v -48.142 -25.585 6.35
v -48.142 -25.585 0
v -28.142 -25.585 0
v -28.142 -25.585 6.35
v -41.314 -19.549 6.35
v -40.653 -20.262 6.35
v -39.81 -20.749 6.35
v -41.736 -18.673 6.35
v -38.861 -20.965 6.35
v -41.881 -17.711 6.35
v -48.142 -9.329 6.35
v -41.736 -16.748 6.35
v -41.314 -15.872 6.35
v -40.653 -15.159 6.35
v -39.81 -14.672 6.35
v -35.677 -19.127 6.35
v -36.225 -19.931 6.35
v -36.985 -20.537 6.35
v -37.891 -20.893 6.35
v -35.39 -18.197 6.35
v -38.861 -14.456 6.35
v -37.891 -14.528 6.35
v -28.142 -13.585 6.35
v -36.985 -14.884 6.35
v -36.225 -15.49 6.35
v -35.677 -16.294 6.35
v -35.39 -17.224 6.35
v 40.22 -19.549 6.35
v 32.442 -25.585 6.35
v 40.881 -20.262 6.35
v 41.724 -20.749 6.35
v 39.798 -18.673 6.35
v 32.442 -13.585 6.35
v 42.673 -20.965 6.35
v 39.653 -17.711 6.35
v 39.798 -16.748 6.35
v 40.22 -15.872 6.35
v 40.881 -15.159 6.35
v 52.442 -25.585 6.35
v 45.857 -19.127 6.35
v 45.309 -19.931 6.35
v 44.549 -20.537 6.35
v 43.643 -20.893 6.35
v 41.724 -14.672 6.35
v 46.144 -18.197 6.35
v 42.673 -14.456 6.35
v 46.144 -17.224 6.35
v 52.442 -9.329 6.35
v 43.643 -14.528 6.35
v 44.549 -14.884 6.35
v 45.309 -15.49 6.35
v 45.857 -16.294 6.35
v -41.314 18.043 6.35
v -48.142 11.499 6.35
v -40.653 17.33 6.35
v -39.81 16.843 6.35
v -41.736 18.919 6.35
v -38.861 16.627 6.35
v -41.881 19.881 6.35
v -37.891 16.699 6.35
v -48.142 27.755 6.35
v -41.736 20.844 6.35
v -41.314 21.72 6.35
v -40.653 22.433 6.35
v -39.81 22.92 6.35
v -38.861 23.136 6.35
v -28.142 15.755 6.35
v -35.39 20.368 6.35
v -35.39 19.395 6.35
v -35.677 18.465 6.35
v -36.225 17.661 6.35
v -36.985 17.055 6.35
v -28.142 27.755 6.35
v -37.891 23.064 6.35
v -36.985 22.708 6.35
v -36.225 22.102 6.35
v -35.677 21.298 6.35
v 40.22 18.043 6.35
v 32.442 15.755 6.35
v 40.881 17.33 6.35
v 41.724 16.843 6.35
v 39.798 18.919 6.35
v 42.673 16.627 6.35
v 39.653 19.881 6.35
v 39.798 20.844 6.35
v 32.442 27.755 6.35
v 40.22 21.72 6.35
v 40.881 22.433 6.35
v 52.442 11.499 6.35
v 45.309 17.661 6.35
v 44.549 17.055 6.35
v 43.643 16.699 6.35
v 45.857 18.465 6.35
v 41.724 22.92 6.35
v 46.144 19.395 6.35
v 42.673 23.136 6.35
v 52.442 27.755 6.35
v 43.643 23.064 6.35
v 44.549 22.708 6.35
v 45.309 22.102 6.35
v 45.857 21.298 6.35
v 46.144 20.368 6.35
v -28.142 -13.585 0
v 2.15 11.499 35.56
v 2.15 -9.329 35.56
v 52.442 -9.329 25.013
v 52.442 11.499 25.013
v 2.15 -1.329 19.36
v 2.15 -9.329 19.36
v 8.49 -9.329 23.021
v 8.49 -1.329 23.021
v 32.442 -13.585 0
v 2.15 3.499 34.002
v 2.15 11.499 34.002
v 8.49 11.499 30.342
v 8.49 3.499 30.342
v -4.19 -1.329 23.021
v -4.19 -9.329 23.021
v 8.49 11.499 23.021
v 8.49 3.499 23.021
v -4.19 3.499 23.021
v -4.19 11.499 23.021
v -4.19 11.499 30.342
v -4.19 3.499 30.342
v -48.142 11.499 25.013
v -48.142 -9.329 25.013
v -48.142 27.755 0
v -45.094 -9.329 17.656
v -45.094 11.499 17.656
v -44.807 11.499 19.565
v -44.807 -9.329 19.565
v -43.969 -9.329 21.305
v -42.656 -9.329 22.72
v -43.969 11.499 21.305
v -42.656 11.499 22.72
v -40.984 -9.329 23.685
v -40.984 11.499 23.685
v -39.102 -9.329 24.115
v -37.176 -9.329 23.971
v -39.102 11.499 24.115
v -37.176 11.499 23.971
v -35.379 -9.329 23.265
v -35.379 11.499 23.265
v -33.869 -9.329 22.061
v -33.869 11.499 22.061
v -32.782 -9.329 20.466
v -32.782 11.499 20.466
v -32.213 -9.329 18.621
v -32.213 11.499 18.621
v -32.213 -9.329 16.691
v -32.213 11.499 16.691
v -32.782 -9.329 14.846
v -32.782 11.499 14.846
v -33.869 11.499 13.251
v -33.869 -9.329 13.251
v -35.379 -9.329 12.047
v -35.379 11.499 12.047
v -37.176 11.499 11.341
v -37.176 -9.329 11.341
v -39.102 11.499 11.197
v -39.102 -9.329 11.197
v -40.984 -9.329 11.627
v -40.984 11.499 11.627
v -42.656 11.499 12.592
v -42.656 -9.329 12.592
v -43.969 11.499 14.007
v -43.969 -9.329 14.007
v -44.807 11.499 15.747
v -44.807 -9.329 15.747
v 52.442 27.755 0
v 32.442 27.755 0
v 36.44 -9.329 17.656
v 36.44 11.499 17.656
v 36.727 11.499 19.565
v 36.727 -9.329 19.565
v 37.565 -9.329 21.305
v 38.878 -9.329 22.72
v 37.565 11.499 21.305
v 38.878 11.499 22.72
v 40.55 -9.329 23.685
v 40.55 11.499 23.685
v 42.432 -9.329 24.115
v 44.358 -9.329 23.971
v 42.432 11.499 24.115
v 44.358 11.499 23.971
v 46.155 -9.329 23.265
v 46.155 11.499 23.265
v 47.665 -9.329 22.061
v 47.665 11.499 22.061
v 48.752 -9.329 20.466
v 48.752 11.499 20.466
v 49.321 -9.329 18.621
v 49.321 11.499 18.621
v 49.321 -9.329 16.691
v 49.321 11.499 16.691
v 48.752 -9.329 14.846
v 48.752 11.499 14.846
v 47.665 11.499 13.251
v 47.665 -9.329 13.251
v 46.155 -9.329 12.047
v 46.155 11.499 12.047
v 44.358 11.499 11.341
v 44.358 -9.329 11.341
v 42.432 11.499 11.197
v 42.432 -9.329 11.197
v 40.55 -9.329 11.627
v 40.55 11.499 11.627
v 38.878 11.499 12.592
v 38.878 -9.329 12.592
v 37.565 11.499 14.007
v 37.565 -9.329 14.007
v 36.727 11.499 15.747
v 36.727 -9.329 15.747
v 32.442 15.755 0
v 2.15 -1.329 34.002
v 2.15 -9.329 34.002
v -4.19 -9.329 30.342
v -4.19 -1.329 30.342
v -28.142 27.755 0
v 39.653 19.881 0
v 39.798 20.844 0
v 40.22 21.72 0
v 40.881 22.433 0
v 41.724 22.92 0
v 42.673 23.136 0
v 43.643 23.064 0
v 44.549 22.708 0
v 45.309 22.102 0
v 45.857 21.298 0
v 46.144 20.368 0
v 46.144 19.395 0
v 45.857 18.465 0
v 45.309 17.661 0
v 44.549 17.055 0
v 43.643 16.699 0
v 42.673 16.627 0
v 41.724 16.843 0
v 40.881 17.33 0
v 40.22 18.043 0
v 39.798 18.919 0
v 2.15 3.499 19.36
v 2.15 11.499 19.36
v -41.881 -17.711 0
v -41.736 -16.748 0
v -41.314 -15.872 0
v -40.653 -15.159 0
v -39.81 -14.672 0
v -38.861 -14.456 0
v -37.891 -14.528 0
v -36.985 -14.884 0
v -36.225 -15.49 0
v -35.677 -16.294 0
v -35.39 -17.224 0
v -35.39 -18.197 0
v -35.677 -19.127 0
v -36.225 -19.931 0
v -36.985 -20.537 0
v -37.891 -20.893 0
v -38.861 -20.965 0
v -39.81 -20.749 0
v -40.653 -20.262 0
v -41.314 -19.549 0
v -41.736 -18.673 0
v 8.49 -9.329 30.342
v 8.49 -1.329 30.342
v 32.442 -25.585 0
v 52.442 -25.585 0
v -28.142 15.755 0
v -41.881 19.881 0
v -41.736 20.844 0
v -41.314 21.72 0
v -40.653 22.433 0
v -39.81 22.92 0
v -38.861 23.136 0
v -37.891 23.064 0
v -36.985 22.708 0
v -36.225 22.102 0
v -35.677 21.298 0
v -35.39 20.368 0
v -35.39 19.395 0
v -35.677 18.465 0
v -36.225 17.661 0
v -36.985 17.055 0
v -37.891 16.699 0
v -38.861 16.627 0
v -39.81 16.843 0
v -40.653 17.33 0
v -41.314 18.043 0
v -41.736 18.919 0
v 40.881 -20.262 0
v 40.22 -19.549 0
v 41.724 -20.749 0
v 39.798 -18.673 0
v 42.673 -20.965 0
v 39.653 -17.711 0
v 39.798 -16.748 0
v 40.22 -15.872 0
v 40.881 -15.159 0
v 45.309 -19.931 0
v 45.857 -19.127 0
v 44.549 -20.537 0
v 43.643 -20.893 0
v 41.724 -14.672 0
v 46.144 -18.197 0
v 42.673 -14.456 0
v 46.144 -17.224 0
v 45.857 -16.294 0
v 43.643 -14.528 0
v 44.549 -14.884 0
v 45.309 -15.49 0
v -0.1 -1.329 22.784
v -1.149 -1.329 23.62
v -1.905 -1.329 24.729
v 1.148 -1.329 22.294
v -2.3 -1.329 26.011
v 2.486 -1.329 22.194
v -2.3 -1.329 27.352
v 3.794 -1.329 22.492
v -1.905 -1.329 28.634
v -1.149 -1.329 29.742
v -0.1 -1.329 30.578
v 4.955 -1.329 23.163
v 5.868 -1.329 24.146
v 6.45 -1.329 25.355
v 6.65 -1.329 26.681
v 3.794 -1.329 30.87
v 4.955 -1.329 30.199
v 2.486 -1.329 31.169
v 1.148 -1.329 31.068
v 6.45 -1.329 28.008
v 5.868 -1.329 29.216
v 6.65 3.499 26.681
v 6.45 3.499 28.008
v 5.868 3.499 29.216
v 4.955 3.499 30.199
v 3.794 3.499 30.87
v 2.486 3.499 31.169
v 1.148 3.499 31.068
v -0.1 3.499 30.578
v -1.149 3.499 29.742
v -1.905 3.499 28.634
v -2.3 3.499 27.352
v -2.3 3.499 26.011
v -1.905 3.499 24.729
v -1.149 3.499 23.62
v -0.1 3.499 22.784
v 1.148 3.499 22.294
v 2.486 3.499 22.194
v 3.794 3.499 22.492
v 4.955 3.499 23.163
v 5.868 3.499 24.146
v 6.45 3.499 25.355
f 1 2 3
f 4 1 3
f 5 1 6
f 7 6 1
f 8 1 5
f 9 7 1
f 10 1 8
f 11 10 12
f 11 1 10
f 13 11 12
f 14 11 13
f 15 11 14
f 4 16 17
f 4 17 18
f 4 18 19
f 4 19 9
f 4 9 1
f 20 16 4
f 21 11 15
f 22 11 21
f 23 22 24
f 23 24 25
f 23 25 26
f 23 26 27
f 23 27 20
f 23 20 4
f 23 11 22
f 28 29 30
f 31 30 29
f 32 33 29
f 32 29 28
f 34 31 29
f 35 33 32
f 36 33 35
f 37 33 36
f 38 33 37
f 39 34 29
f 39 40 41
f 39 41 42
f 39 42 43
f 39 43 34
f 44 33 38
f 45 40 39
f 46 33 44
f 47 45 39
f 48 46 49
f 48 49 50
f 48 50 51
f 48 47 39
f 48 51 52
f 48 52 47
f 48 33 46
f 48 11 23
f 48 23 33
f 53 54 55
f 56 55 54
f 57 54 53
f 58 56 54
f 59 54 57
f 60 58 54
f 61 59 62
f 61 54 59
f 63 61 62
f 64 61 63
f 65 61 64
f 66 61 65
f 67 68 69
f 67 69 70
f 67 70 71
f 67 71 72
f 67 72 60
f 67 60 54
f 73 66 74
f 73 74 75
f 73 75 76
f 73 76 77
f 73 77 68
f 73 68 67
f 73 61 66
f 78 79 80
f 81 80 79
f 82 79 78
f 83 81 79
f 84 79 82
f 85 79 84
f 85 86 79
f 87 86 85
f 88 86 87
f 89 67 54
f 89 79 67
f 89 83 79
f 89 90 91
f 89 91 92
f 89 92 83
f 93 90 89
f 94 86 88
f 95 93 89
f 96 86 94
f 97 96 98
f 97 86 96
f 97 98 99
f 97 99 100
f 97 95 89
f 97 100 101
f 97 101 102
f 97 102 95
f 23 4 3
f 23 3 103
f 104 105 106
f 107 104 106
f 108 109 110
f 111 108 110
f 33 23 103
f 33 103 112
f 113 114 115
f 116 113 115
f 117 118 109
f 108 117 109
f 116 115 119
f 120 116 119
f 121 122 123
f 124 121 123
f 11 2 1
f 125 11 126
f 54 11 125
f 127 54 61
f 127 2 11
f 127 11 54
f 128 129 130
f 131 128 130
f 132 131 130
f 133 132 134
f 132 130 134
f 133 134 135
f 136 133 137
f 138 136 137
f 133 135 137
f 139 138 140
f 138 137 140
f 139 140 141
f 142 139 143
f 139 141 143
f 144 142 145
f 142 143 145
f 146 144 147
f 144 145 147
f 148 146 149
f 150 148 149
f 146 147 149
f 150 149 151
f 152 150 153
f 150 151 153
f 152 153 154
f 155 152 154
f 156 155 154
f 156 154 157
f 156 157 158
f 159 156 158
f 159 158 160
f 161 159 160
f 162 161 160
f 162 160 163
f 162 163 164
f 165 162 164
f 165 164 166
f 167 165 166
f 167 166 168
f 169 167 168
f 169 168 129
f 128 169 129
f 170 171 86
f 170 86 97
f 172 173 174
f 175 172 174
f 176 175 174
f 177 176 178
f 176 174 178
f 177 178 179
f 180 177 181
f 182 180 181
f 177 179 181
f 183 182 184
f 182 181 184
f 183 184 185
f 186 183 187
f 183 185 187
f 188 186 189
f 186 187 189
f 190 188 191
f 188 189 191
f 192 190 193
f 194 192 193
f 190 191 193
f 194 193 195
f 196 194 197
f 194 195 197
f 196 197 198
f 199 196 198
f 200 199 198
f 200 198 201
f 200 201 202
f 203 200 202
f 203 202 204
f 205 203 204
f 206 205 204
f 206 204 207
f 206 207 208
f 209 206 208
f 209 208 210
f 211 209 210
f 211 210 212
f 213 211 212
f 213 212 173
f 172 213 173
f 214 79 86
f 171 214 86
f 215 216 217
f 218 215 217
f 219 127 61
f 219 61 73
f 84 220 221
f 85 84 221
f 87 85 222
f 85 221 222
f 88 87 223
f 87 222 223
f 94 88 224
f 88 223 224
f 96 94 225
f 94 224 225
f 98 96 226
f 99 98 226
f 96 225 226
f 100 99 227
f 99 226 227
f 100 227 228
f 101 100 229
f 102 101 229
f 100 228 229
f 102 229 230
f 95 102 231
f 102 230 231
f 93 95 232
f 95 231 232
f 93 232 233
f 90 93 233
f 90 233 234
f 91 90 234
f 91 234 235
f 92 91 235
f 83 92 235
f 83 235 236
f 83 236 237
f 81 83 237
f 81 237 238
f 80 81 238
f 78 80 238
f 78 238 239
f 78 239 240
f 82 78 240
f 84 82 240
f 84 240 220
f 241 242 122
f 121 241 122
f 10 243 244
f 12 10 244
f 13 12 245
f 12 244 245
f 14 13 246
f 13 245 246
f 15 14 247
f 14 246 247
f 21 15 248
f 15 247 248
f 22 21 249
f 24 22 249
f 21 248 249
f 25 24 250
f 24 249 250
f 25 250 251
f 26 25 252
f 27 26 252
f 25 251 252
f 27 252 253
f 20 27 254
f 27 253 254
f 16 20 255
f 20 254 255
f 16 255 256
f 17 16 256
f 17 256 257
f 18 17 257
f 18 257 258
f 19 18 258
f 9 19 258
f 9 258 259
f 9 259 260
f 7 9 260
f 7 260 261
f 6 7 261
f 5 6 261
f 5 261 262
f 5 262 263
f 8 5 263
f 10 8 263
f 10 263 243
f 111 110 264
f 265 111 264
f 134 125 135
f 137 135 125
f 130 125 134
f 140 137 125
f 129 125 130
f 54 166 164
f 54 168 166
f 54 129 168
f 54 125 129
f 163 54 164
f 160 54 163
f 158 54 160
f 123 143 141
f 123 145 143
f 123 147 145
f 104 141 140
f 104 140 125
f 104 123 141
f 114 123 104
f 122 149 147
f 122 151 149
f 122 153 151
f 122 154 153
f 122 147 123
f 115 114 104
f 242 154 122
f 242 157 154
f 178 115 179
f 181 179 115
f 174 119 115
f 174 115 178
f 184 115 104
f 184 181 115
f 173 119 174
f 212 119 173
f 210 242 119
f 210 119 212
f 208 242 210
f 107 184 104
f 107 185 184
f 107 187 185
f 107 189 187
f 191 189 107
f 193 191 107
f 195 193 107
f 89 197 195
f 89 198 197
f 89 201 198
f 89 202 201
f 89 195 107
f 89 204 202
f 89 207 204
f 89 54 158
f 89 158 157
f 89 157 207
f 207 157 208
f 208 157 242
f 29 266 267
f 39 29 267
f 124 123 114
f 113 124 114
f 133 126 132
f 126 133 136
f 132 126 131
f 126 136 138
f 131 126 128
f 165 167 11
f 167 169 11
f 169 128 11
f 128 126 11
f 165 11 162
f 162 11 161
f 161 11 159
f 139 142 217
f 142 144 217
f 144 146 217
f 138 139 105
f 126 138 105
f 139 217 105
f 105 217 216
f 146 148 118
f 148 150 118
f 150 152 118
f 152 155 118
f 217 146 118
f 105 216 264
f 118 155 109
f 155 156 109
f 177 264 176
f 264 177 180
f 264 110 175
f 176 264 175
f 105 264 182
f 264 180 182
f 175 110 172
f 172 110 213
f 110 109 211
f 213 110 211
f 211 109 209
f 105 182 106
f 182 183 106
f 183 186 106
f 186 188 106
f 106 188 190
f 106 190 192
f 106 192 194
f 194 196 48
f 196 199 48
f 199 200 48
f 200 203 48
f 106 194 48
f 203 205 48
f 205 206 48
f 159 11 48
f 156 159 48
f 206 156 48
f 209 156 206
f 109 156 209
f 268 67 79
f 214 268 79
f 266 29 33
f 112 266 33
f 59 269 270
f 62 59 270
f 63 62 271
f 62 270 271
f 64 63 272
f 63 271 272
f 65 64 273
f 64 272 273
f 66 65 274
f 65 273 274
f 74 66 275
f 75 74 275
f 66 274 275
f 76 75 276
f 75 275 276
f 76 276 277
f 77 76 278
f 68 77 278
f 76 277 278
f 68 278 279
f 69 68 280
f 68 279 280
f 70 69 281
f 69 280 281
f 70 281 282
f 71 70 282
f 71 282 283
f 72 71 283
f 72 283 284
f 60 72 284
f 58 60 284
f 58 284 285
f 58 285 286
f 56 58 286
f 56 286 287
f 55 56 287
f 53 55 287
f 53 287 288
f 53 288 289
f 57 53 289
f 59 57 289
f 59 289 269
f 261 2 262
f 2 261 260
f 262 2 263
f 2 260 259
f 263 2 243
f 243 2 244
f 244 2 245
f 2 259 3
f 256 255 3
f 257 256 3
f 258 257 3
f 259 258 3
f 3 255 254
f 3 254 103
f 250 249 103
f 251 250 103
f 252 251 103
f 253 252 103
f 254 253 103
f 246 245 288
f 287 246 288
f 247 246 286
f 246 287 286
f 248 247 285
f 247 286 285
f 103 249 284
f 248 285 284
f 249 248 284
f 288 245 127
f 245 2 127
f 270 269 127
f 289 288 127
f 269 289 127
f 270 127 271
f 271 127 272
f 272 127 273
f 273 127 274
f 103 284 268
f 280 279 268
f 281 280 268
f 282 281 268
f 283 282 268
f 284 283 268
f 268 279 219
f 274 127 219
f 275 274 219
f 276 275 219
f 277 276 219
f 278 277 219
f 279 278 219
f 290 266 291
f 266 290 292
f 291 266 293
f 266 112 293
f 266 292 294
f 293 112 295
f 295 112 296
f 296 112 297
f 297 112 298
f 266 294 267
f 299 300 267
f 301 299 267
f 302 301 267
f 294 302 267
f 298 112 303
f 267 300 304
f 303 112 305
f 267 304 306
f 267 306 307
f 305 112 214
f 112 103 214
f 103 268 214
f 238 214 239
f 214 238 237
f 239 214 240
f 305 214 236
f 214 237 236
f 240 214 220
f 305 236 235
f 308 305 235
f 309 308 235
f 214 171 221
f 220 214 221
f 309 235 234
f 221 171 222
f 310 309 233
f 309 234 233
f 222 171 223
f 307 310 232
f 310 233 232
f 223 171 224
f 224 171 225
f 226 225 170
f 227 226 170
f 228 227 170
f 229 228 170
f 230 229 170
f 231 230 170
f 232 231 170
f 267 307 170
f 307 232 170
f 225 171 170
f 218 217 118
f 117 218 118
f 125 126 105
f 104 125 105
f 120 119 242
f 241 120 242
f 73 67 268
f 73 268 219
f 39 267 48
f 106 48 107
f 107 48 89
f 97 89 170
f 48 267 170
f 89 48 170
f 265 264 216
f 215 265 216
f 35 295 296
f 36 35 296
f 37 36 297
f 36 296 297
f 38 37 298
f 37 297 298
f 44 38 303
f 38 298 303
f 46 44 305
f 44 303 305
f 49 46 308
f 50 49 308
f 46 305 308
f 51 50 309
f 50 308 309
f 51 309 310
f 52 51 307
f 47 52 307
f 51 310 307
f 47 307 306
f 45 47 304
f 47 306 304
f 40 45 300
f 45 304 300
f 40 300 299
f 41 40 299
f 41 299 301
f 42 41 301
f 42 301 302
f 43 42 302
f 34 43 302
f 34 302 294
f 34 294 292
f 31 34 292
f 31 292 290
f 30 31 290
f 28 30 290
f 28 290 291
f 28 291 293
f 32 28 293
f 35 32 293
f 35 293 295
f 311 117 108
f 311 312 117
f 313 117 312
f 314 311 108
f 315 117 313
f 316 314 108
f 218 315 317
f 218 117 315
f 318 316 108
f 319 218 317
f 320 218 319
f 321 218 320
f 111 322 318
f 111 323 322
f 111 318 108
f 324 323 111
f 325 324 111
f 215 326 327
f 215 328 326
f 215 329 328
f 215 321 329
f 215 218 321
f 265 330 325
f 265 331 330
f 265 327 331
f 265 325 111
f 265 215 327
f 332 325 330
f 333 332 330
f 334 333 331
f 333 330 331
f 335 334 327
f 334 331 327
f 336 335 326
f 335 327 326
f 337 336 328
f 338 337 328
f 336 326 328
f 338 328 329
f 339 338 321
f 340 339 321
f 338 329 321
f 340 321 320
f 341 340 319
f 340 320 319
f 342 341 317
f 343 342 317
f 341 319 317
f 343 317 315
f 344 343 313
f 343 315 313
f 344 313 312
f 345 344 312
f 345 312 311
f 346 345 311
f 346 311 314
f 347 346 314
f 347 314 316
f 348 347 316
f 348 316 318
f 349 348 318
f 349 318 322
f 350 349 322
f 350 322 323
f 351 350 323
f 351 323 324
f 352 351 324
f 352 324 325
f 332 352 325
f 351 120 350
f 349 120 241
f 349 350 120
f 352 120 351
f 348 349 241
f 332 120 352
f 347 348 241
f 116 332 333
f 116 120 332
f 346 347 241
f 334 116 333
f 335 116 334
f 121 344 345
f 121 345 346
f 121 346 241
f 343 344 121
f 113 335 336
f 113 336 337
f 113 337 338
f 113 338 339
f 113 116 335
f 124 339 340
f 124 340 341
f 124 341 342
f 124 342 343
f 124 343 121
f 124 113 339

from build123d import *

# Parameters (mm, degrees)
F0_W      = 100.584
F0_H      = 53.34
F1_DEPTH  = 6.35
F2_W      = 100.584
F2_H      = 20.828
F3_DEPTH  = 29.21
F5_DEPTH  = 8
F7_DEPTH  = 8
F9_D      = 9
F11_D     = 12.954
F13_D     = 6.528
F14_W     = 60.584
F14_H     = 12
F15_DEPTH = 6.35
F16_W     = 60.584
F16_H     = 12
F17_DEPTH = 6.35
F19_DEPTH = 20.828


with BuildPart() as f1:
    # F0 (on Top) → F1 (new body)
    with BuildSketch(Plane.XY):
        with Locations((2.149524, 1.085451)):
            Rectangle(F0_W, F0_H)
    extrude(amount=F1_DEPTH)

    # F2 (on face) → F3 (join)
    with BuildSketch(Plane.XY.offset(6.35)):
        with Locations((2.149524, 1.085451)):
            Rectangle(F2_W, F2_H)
    extrude(amount=F3_DEPTH)

    # F4 (on face) → F5 (cut)
    with BuildSketch(Plane.XZ.offset(9.328549)):
        Polygon((8.489524, 23.020798), (8.489524, 30.341599), (2.149524, 34.002), (-4.190476, 30.341599), (-4.190476, 23.020798), (2.149524, 19.360397), align=None)
    extrude(amount=-F5_DEPTH, mode=Mode.SUBTRACT)

    # F6 (on face) → F7 (cut)
    with BuildSketch(Plane(origin=(0, 11.499451, 0), x_dir=(-1, 0, 0), z_dir=(0, 1, 0))):
        Polygon((4.190476, 23.020798), (4.190476, 30.341599), (-2.149524, 34.002), (-8.489524, 30.341599), (-8.489524, 23.020798), (-2.149524, 19.360397), align=None)
    extrude(amount=-F7_DEPTH, mode=Mode.SUBTRACT)

    # F9 (through all)
    with Locations(Plane(origin=(0, 11.499451, 0), x_dir=(-1, 0, 0), z_dir=(0, 1, 0))):
        with Locations((-2.149524, 26.681199)):
            Hole(F9_D / 2)

    # F11 (through all)
    with Locations(Plane.XZ.offset(9.328549)):
        with Locations((42.916524, 17.656), (-38.617476, 17.656)):
            Hole(F11_D / 2)

    # F13 (through all)
    with Locations(Plane.XY.offset(6.35)):
        with Locations((-38.617476, -17.710549), (-38.617476, 19.881451), (42.916524, 19.881451), (42.916524, -17.710549)):
            Hole(F13_D / 2)

    # F14 (on face) → F15 (cut, through all)
    with BuildSketch(Plane.XY.offset(6.35)):
        with Locations((2.149524, 21.755451)):
            Rectangle(F14_W, F14_H)
    extrude(amount=-F15_DEPTH, mode=Mode.SUBTRACT)

    # F16 (on face) → F17 (cut, through all)
    with BuildSketch(Plane.XY.offset(6.35)):
        with Locations((2.149524, -19.584549)):
            Rectangle(F16_W, F16_H)
    extrude(amount=-F17_DEPTH, mode=Mode.SUBTRACT)

    # F18 (on face) → F19 (cut, through all)
    with BuildSketch(Plane.XZ.offset(9.328549)):
        Polygon((-48.142476, 25.013294), (2.149524, 35.56), (-48.142476, 35.56), align=None)
        Polygon((52.441524, 35.56), (2.149524, 35.56), (52.441524, 25.013294), align=None)
    extrude(amount=-F19_DEPTH, mode=Mode.SUBTRACT)


solid = f1.part
